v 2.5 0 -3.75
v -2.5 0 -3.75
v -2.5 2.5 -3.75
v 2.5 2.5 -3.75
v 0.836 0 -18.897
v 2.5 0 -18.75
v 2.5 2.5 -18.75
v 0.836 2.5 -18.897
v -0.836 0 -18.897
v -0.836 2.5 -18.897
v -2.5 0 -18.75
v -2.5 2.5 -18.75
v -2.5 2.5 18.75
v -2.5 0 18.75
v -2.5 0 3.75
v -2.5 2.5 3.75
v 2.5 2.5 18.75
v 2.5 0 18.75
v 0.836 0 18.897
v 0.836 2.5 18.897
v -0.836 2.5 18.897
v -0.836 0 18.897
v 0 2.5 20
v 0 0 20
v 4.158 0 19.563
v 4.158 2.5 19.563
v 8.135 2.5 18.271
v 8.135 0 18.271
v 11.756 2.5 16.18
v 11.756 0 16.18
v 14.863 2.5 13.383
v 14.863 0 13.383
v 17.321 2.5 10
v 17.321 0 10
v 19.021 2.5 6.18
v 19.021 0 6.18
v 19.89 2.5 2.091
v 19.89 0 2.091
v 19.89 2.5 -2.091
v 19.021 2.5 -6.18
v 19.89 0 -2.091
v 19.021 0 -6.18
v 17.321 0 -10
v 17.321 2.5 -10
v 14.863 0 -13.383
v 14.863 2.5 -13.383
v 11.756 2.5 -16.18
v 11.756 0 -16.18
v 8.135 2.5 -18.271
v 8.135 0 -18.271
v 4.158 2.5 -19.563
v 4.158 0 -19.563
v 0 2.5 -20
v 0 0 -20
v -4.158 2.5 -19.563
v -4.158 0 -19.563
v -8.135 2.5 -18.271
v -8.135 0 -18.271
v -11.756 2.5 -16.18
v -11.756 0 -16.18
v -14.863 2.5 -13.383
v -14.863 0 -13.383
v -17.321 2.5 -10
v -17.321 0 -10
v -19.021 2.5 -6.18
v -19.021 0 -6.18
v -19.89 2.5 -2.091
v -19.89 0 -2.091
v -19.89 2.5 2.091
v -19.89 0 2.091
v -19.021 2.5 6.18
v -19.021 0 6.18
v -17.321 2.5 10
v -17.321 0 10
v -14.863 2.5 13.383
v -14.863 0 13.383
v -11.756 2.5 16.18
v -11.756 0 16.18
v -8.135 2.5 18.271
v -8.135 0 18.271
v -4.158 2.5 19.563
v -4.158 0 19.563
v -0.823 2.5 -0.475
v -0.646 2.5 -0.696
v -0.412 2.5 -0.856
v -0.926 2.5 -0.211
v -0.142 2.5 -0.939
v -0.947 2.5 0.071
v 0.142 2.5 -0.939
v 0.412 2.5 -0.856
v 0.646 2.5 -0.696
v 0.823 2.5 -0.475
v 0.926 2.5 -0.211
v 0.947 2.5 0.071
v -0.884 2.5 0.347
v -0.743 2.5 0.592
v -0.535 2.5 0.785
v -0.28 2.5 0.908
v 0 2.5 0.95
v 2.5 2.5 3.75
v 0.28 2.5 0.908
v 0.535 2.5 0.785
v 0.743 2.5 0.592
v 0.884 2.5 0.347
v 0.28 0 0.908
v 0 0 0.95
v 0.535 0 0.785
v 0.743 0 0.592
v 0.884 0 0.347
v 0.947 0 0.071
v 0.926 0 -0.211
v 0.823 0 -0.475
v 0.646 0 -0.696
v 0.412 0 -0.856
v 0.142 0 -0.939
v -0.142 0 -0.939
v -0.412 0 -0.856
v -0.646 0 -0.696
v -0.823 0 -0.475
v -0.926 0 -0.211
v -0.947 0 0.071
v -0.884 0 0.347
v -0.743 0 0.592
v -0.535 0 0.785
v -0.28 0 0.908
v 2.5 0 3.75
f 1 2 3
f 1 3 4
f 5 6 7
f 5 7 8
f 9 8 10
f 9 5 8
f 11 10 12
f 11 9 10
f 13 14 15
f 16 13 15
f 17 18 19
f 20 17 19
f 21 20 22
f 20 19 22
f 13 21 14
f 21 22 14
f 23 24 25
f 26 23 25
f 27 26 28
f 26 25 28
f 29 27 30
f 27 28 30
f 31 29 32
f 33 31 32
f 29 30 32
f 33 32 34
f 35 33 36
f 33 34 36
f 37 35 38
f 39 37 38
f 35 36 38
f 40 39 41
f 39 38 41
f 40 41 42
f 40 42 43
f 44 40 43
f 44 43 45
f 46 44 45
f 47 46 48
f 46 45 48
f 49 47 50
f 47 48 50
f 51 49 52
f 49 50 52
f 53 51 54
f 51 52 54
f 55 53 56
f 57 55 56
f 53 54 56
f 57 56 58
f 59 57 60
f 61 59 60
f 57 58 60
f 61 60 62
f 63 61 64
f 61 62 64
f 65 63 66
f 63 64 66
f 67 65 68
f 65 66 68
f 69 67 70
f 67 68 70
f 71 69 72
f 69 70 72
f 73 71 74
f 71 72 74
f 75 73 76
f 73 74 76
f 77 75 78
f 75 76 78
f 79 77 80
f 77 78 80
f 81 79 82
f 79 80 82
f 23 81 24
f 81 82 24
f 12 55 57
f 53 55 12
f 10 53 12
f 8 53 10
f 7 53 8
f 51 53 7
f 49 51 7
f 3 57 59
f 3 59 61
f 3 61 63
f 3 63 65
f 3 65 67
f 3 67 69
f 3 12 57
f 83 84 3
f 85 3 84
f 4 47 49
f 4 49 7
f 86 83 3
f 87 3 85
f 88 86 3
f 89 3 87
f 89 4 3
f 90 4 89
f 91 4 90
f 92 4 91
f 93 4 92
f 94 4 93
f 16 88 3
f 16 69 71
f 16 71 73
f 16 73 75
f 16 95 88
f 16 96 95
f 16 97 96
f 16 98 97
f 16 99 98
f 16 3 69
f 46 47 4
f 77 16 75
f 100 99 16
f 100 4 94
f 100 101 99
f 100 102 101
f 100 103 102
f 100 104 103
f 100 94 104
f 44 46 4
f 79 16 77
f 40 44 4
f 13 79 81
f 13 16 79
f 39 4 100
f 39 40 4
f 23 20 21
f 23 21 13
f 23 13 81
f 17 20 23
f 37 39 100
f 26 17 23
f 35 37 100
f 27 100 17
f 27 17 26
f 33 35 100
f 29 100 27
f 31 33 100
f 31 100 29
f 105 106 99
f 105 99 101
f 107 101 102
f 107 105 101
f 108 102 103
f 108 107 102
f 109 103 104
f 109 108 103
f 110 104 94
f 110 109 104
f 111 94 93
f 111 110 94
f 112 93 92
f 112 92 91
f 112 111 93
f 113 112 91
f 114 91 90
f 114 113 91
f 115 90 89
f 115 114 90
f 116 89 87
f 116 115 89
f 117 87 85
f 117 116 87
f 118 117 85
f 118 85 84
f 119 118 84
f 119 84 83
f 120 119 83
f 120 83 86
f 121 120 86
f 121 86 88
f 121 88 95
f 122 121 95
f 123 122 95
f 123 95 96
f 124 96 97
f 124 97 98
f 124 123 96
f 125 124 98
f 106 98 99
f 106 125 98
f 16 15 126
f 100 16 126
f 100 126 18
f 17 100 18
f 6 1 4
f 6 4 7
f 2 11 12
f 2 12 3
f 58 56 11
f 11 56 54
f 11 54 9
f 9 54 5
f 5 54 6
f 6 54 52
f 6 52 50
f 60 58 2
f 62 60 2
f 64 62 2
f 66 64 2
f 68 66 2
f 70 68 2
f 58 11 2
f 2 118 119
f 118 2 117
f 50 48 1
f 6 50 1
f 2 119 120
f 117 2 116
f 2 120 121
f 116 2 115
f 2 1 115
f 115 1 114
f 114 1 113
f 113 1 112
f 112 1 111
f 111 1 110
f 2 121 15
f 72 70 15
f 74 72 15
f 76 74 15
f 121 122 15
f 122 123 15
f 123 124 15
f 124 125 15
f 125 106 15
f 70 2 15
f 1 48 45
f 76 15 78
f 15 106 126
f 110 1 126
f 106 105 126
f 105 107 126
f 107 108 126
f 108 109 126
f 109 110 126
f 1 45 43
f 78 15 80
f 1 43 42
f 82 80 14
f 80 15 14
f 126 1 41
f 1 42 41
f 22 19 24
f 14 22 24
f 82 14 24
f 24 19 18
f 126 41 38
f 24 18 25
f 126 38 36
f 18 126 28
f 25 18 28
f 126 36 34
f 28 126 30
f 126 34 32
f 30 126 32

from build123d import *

# Parameters (mm, degrees)
SKETCH1_R           = 20
SKETCH1_R_2         = 0.95
BOSS_EXTRUDE1_DEPTH = 2.5


with BuildPart() as part:
    # Sketch1 → Boss-Extrude1 (new body)
    with BuildSketch(Plane(origin=(0, 0, 0), x_dir=(1, 0, 0), z_dir=(0, 1, 0))):
        with Locations(Location((0, 0, 0), (0, 0, 270))):
            Circle(SKETCH1_R)
        with Locations(Location((0, 0, 0), (0, 0, 270))):
            Circle(SKETCH1_R_2, mode=Mode.SUBTRACT)
        with BuildLine():
            Line((-2.5, 3.75), (2.5, 3.75))
            Line((2.5, 3.75), (2.5, 18.75))
            ThreePointArc((2.5, 18.75), (0, 18.915932438), (-2.5, 18.75))
            Line((-2.5, 18.75), (-2.5, 3.75))
        make_face(mode=Mode.SUBTRACT)
        with BuildLine():
            Line((2.5, -3.75), (2.5, -18.75))
            ThreePointArc((2.5, -18.75), (0, -18.915932438), (-2.5, -18.75))
            Line((-2.5, -18.75), (-2.5, -3.75))
            Line((-2.5, -3.75), (2.5, -3.75))
        make_face(mode=Mode.SUBTRACT)
    extrude(amount=BOSS_EXTRUDE1_DEPTH)


solid = part.part
